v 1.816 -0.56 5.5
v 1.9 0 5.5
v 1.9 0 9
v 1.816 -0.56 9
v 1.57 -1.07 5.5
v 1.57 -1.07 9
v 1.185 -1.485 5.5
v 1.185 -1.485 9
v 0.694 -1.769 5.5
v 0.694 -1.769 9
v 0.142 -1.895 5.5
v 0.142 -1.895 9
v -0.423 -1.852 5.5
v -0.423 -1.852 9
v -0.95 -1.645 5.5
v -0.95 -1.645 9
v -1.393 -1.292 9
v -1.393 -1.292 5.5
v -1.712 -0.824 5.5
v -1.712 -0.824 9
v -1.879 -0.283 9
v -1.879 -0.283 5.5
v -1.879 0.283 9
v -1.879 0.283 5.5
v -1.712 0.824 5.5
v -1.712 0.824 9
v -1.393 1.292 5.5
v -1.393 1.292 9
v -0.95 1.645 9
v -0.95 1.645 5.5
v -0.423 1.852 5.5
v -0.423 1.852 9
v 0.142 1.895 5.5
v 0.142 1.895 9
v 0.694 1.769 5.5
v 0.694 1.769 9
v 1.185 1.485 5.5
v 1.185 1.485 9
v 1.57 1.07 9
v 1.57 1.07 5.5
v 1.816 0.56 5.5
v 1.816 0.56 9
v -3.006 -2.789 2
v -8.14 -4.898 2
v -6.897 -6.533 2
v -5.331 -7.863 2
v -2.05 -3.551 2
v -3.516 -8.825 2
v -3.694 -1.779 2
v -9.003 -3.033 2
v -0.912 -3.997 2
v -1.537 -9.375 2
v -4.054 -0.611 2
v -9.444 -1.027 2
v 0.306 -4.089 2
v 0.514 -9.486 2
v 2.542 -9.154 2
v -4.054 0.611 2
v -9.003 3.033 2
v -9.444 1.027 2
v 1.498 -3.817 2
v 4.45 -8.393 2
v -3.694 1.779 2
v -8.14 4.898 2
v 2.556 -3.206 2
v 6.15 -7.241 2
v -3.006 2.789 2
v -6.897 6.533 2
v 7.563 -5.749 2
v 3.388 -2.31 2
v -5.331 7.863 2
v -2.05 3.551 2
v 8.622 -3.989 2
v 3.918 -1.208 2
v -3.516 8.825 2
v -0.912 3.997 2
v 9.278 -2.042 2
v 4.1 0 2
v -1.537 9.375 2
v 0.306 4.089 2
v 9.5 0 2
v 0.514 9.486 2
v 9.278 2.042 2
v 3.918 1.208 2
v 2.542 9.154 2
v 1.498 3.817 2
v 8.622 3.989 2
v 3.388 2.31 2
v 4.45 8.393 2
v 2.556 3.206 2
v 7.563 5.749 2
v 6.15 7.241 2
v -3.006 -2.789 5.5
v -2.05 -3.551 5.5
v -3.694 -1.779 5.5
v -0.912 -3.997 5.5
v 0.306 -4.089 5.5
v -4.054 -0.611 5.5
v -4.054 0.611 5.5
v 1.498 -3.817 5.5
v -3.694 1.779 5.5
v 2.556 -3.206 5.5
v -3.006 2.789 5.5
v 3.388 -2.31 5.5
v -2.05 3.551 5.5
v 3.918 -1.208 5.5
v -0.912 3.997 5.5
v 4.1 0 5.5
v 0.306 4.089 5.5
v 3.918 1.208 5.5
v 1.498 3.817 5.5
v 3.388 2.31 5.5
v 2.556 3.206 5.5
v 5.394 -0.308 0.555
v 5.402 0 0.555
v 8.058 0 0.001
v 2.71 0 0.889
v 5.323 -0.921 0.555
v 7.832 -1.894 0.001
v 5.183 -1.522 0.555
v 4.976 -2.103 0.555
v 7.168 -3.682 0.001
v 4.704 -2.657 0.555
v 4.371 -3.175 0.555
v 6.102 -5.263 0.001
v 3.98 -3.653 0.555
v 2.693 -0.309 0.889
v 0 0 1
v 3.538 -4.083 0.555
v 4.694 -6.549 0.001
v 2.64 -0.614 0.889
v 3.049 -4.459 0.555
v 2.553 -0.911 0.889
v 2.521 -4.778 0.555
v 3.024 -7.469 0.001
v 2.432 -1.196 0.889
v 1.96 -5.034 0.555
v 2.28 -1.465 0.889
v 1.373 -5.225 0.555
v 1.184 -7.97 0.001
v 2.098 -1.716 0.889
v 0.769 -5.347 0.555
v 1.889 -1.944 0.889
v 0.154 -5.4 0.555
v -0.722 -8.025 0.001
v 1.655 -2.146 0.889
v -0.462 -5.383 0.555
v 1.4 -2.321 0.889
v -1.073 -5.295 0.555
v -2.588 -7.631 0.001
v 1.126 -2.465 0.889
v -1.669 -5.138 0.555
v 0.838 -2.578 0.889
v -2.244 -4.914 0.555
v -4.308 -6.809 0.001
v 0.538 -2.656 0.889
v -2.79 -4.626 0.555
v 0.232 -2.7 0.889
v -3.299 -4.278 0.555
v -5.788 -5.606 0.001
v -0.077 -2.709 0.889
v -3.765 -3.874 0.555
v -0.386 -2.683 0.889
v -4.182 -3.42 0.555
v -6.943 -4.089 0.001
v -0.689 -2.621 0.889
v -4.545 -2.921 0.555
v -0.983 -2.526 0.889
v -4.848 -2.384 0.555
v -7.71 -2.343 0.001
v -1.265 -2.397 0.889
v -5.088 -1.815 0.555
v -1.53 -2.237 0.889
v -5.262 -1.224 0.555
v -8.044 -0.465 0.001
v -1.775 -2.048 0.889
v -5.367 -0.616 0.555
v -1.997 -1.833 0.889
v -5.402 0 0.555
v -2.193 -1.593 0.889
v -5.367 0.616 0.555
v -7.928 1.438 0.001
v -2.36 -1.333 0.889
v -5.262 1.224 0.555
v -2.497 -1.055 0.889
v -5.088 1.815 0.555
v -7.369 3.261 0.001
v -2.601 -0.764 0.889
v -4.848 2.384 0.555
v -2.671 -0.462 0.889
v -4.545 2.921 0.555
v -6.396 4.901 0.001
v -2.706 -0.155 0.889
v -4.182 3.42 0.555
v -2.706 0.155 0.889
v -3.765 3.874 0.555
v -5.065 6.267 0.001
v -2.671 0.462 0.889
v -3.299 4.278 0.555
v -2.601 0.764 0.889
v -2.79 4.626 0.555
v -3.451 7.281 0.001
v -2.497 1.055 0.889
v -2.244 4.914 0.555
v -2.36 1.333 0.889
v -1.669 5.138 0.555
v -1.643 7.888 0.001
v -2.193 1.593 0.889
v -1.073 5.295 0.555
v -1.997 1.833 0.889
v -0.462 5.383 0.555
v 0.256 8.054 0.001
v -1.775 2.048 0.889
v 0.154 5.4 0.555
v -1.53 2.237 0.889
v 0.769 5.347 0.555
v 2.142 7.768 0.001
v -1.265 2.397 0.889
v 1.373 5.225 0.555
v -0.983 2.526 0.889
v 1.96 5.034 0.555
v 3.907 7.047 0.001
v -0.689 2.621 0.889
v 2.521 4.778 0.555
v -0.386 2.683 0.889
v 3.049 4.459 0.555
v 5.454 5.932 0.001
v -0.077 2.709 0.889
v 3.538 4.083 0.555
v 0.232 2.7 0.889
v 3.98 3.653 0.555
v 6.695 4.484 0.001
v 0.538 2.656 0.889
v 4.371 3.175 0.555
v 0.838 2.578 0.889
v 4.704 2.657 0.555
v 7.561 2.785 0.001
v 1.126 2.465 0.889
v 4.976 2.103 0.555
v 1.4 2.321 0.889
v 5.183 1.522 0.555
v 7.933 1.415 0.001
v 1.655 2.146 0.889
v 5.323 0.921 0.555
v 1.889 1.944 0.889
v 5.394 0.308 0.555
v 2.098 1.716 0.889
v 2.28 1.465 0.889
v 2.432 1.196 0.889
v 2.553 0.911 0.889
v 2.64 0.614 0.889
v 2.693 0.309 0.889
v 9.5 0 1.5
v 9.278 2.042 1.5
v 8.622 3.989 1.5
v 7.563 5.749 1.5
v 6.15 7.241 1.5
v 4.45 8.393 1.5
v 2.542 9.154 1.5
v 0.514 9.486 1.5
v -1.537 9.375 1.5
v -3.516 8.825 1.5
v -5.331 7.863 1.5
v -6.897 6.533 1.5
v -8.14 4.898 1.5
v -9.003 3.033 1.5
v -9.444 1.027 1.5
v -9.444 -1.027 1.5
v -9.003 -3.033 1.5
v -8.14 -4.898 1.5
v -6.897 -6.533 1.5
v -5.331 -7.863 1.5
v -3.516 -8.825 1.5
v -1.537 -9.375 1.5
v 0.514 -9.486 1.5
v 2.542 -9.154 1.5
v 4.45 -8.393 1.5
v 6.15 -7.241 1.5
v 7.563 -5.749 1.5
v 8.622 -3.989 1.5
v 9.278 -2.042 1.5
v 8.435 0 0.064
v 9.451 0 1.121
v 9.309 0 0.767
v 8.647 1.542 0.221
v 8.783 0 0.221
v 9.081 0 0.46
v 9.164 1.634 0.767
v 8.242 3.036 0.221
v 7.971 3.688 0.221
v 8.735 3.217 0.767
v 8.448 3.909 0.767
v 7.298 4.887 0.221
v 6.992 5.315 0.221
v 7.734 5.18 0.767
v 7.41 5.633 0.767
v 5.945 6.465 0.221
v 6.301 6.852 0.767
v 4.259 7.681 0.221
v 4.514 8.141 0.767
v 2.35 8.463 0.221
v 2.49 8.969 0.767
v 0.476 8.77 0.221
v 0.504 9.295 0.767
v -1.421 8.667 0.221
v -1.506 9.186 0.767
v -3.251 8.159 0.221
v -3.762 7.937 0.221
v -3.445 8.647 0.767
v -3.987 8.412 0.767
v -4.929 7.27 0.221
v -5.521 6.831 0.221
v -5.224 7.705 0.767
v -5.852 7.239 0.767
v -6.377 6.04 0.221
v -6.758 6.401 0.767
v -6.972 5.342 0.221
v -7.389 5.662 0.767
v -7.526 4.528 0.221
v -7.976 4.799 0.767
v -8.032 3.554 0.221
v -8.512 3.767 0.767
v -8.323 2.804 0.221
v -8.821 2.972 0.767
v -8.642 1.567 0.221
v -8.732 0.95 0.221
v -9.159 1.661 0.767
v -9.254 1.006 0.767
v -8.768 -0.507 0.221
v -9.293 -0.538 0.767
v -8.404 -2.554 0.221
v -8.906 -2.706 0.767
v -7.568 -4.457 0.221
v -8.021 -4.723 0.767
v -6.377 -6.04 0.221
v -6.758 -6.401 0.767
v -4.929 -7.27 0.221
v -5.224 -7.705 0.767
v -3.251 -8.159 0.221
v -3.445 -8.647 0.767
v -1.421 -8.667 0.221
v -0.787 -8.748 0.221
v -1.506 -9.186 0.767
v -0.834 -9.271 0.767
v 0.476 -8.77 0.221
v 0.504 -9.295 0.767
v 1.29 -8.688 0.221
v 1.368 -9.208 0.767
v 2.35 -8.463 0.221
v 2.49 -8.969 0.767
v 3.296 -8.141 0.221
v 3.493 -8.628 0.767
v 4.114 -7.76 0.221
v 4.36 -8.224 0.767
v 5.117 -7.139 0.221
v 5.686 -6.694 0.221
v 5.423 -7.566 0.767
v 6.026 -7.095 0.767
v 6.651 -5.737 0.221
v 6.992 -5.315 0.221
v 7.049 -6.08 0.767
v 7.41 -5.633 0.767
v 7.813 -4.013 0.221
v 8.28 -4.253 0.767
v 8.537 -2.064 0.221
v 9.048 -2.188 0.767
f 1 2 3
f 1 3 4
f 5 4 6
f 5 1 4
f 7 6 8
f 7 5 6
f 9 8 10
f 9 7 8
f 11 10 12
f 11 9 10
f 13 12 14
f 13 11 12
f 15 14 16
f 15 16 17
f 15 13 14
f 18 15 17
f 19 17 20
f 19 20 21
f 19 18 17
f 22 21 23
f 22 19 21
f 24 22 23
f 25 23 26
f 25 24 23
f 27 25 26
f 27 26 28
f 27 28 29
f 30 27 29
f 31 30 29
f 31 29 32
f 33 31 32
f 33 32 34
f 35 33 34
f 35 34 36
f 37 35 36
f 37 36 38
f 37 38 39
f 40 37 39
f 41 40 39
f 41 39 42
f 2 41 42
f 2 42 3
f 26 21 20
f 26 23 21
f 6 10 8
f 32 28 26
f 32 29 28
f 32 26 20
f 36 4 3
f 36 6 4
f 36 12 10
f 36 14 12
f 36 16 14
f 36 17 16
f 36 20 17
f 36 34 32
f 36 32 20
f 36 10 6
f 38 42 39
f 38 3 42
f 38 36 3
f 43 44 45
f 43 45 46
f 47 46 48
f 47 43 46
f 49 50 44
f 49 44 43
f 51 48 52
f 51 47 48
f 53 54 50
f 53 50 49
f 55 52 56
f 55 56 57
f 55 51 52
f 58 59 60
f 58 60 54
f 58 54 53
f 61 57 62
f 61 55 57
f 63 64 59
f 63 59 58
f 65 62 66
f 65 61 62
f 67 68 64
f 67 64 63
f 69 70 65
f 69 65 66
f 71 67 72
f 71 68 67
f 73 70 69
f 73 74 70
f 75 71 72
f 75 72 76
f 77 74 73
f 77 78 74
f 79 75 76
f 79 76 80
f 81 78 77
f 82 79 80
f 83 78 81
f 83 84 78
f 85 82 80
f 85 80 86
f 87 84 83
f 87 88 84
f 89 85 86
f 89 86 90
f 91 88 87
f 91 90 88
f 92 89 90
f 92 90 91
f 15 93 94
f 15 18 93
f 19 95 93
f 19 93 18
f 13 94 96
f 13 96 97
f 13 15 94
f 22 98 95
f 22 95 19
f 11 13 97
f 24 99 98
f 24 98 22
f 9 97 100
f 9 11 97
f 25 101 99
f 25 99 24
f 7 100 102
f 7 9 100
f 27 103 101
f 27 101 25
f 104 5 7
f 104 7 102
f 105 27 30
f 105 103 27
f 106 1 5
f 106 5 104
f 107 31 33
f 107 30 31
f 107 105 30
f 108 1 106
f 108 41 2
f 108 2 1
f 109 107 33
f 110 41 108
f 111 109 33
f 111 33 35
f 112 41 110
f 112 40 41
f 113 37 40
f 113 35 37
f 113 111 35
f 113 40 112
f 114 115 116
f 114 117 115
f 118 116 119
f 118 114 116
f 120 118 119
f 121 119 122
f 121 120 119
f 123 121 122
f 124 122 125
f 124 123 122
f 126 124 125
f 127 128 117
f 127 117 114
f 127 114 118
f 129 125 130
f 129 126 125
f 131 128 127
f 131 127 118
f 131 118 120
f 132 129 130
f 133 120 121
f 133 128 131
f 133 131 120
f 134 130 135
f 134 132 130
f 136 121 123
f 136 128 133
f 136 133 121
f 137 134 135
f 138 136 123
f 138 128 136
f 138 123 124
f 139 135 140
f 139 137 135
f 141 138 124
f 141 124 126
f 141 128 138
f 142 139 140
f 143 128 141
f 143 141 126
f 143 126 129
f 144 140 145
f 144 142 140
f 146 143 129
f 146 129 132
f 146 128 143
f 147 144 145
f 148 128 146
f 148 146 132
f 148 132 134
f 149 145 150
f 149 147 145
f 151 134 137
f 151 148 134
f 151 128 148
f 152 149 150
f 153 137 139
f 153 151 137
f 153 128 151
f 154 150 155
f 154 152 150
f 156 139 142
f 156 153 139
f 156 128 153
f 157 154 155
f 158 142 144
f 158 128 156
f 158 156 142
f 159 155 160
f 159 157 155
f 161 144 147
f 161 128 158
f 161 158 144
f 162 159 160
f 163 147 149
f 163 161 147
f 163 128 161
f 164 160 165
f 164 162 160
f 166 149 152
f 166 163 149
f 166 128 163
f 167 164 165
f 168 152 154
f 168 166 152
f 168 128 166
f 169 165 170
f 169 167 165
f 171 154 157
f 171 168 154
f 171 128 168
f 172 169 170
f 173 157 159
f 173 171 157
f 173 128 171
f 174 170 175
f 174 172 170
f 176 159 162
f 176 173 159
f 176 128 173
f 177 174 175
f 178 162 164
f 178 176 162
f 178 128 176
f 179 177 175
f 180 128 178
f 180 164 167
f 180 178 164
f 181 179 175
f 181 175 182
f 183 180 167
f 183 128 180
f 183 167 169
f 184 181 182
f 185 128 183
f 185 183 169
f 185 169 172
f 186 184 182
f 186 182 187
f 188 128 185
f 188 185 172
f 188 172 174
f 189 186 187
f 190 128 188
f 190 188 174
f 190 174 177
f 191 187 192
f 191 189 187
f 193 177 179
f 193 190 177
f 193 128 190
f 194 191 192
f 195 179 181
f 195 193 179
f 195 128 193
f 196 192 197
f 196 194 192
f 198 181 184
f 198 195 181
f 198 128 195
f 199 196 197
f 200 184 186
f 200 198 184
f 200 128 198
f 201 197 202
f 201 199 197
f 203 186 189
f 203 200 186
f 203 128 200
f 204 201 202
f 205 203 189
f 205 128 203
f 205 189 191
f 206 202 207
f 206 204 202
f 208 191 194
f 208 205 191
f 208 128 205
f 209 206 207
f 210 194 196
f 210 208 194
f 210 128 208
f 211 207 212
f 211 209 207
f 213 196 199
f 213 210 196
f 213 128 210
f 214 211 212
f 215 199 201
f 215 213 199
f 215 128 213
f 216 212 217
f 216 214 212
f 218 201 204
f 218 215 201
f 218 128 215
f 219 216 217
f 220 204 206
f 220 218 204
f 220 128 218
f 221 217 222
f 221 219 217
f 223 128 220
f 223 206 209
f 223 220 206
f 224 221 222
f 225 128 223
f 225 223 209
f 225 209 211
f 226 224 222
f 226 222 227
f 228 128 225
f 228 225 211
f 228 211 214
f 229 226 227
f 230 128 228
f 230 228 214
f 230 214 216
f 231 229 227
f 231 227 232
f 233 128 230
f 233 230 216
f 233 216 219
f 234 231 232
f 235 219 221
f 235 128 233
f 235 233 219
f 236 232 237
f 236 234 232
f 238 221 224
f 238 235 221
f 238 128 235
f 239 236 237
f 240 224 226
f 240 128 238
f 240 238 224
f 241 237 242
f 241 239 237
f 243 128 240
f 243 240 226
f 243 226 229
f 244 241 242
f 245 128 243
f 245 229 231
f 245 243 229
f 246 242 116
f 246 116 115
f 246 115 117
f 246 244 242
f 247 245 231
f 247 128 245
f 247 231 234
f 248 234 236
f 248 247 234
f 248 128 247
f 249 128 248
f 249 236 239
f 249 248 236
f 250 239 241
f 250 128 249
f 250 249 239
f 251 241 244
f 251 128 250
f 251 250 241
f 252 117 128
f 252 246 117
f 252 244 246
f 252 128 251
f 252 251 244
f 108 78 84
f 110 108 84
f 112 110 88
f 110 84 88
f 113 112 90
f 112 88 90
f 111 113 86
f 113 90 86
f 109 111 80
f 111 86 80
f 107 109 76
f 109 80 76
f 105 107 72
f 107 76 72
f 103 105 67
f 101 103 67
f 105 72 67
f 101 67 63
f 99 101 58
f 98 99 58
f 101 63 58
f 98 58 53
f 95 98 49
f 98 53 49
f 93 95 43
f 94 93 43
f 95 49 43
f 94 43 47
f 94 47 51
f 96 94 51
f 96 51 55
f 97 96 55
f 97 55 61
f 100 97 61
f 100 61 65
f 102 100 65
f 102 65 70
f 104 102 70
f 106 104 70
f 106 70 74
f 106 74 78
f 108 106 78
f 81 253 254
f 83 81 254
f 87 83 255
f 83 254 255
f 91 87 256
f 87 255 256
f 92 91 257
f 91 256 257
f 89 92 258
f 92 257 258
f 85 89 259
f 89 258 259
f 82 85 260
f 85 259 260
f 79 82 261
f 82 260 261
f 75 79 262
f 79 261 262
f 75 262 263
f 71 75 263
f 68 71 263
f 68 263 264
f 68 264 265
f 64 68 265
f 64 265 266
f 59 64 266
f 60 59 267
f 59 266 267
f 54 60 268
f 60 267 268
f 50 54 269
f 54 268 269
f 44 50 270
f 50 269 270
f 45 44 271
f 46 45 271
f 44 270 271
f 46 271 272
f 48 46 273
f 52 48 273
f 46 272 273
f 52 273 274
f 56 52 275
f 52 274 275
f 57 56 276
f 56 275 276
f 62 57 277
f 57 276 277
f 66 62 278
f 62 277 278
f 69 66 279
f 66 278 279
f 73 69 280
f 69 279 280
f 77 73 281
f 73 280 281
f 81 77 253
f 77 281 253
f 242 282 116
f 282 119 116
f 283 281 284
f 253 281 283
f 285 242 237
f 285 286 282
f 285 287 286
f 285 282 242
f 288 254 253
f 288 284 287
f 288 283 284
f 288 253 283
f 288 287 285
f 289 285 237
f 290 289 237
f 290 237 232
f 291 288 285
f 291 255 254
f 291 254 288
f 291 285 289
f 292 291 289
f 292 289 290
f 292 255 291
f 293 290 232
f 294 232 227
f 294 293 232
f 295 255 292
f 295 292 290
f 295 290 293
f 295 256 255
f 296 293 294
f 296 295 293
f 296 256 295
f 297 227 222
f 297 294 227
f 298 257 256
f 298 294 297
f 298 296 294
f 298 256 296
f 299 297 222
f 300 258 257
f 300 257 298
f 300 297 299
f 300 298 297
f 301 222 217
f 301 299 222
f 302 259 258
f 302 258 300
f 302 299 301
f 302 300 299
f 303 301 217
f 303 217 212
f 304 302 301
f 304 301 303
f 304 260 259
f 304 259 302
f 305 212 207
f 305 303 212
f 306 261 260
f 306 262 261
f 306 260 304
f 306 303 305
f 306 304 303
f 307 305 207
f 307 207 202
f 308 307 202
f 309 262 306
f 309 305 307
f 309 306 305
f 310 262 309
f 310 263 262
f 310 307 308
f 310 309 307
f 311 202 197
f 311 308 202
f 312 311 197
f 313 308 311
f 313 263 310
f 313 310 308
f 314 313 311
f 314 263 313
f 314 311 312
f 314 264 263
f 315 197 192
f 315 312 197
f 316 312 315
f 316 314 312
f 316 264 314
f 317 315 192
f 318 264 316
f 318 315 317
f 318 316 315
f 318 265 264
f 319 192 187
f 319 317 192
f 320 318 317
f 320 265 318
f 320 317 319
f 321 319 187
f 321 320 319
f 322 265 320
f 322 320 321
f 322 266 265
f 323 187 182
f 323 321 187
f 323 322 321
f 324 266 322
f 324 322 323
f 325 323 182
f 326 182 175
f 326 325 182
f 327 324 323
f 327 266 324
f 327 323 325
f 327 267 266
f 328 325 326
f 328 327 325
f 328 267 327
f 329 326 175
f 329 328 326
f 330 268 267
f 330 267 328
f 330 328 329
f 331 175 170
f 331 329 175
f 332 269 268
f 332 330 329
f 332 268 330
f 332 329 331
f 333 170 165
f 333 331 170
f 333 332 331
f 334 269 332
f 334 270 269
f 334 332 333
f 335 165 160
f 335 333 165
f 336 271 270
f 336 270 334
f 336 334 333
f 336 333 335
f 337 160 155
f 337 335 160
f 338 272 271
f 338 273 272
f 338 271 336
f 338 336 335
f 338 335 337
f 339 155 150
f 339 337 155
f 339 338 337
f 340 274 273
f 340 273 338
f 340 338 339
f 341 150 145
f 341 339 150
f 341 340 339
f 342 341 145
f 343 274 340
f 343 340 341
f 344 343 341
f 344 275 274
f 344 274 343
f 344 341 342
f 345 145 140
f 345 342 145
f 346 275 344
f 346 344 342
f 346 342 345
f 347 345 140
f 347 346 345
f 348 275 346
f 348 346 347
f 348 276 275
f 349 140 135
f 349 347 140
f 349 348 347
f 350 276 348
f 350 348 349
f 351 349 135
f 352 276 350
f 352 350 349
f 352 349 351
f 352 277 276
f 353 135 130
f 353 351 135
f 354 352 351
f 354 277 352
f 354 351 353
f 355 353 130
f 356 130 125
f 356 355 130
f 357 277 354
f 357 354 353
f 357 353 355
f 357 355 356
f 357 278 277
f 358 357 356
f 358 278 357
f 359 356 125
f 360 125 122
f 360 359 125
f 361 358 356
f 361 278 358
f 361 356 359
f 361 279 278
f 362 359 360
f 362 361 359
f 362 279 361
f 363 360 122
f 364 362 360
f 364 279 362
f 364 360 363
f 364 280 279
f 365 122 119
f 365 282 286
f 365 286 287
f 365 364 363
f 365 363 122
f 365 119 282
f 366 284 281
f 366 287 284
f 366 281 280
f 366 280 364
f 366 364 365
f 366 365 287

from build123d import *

# Parameters (mm, degrees)
F0_R     = 9.5
F0_R_2   = 4.1
F0_R_3   = 1.9
F1_DEPTH = 2
F2_R     = 4.1
F2_R_2   = 1.9
F3_DEPTH = 5.5
F4_R     = 1.5
F7_DEPTH = 7


# Not quite as in the source:
# - a feature names something its author has since deleted; it is built from what else it names


with BuildPart() as f1:
    # F0 (on Top) → F1 (new body)
    with BuildSketch(Plane.XY):
        Circle(F0_R)
        Circle(F0_R_2, mode=Mode.SUBTRACT)
        Circle(F0_R_2)
        Circle(F0_R_3, mode=Mode.SUBTRACT)
        Circle(F0_R_3)
    extrude(amount=F1_DEPTH)

    # F2 (on Top) → F3 (join)
    with BuildSketch(Plane.XY):
        Circle(F2_R)
        Circle(F2_R_2, mode=Mode.SUBTRACT)
    extrude(amount=F3_DEPTH)

    # F4
    f4_edges = [f1.edges().sort_by_distance(p)[0] for p in [
        (-9.5, 0, 0),
    ]]
    fillet(f4_edges, radius=F4_R)

    # F5 (on Front) → F6 (revolve, cut)
    with BuildSketch(Plane.XZ):
        with BuildLine():
            ThreePointArc((0, 0), (23.1570723538, -9.489364109), (32.9962119038, -32.5))
            ThreePointArc((32.9962119038, -32.5), (23.510635891, -8.8429276462), (0, 1))
            Line((0, 1), (0, 0))
        make_face()
    revolve(axis=Axis((0, 0, -31.5146126637), (0, 0, -1)), mode=Mode.SUBTRACT)

    # F7 (add): a face of the model
    f7_faces = [f1.faces().sort_by_distance(p)[0] for p in [
        (0, 0, 2),
    ]]
    extrude(f7_faces, amount=F7_DEPTH)


solid = f1.part
